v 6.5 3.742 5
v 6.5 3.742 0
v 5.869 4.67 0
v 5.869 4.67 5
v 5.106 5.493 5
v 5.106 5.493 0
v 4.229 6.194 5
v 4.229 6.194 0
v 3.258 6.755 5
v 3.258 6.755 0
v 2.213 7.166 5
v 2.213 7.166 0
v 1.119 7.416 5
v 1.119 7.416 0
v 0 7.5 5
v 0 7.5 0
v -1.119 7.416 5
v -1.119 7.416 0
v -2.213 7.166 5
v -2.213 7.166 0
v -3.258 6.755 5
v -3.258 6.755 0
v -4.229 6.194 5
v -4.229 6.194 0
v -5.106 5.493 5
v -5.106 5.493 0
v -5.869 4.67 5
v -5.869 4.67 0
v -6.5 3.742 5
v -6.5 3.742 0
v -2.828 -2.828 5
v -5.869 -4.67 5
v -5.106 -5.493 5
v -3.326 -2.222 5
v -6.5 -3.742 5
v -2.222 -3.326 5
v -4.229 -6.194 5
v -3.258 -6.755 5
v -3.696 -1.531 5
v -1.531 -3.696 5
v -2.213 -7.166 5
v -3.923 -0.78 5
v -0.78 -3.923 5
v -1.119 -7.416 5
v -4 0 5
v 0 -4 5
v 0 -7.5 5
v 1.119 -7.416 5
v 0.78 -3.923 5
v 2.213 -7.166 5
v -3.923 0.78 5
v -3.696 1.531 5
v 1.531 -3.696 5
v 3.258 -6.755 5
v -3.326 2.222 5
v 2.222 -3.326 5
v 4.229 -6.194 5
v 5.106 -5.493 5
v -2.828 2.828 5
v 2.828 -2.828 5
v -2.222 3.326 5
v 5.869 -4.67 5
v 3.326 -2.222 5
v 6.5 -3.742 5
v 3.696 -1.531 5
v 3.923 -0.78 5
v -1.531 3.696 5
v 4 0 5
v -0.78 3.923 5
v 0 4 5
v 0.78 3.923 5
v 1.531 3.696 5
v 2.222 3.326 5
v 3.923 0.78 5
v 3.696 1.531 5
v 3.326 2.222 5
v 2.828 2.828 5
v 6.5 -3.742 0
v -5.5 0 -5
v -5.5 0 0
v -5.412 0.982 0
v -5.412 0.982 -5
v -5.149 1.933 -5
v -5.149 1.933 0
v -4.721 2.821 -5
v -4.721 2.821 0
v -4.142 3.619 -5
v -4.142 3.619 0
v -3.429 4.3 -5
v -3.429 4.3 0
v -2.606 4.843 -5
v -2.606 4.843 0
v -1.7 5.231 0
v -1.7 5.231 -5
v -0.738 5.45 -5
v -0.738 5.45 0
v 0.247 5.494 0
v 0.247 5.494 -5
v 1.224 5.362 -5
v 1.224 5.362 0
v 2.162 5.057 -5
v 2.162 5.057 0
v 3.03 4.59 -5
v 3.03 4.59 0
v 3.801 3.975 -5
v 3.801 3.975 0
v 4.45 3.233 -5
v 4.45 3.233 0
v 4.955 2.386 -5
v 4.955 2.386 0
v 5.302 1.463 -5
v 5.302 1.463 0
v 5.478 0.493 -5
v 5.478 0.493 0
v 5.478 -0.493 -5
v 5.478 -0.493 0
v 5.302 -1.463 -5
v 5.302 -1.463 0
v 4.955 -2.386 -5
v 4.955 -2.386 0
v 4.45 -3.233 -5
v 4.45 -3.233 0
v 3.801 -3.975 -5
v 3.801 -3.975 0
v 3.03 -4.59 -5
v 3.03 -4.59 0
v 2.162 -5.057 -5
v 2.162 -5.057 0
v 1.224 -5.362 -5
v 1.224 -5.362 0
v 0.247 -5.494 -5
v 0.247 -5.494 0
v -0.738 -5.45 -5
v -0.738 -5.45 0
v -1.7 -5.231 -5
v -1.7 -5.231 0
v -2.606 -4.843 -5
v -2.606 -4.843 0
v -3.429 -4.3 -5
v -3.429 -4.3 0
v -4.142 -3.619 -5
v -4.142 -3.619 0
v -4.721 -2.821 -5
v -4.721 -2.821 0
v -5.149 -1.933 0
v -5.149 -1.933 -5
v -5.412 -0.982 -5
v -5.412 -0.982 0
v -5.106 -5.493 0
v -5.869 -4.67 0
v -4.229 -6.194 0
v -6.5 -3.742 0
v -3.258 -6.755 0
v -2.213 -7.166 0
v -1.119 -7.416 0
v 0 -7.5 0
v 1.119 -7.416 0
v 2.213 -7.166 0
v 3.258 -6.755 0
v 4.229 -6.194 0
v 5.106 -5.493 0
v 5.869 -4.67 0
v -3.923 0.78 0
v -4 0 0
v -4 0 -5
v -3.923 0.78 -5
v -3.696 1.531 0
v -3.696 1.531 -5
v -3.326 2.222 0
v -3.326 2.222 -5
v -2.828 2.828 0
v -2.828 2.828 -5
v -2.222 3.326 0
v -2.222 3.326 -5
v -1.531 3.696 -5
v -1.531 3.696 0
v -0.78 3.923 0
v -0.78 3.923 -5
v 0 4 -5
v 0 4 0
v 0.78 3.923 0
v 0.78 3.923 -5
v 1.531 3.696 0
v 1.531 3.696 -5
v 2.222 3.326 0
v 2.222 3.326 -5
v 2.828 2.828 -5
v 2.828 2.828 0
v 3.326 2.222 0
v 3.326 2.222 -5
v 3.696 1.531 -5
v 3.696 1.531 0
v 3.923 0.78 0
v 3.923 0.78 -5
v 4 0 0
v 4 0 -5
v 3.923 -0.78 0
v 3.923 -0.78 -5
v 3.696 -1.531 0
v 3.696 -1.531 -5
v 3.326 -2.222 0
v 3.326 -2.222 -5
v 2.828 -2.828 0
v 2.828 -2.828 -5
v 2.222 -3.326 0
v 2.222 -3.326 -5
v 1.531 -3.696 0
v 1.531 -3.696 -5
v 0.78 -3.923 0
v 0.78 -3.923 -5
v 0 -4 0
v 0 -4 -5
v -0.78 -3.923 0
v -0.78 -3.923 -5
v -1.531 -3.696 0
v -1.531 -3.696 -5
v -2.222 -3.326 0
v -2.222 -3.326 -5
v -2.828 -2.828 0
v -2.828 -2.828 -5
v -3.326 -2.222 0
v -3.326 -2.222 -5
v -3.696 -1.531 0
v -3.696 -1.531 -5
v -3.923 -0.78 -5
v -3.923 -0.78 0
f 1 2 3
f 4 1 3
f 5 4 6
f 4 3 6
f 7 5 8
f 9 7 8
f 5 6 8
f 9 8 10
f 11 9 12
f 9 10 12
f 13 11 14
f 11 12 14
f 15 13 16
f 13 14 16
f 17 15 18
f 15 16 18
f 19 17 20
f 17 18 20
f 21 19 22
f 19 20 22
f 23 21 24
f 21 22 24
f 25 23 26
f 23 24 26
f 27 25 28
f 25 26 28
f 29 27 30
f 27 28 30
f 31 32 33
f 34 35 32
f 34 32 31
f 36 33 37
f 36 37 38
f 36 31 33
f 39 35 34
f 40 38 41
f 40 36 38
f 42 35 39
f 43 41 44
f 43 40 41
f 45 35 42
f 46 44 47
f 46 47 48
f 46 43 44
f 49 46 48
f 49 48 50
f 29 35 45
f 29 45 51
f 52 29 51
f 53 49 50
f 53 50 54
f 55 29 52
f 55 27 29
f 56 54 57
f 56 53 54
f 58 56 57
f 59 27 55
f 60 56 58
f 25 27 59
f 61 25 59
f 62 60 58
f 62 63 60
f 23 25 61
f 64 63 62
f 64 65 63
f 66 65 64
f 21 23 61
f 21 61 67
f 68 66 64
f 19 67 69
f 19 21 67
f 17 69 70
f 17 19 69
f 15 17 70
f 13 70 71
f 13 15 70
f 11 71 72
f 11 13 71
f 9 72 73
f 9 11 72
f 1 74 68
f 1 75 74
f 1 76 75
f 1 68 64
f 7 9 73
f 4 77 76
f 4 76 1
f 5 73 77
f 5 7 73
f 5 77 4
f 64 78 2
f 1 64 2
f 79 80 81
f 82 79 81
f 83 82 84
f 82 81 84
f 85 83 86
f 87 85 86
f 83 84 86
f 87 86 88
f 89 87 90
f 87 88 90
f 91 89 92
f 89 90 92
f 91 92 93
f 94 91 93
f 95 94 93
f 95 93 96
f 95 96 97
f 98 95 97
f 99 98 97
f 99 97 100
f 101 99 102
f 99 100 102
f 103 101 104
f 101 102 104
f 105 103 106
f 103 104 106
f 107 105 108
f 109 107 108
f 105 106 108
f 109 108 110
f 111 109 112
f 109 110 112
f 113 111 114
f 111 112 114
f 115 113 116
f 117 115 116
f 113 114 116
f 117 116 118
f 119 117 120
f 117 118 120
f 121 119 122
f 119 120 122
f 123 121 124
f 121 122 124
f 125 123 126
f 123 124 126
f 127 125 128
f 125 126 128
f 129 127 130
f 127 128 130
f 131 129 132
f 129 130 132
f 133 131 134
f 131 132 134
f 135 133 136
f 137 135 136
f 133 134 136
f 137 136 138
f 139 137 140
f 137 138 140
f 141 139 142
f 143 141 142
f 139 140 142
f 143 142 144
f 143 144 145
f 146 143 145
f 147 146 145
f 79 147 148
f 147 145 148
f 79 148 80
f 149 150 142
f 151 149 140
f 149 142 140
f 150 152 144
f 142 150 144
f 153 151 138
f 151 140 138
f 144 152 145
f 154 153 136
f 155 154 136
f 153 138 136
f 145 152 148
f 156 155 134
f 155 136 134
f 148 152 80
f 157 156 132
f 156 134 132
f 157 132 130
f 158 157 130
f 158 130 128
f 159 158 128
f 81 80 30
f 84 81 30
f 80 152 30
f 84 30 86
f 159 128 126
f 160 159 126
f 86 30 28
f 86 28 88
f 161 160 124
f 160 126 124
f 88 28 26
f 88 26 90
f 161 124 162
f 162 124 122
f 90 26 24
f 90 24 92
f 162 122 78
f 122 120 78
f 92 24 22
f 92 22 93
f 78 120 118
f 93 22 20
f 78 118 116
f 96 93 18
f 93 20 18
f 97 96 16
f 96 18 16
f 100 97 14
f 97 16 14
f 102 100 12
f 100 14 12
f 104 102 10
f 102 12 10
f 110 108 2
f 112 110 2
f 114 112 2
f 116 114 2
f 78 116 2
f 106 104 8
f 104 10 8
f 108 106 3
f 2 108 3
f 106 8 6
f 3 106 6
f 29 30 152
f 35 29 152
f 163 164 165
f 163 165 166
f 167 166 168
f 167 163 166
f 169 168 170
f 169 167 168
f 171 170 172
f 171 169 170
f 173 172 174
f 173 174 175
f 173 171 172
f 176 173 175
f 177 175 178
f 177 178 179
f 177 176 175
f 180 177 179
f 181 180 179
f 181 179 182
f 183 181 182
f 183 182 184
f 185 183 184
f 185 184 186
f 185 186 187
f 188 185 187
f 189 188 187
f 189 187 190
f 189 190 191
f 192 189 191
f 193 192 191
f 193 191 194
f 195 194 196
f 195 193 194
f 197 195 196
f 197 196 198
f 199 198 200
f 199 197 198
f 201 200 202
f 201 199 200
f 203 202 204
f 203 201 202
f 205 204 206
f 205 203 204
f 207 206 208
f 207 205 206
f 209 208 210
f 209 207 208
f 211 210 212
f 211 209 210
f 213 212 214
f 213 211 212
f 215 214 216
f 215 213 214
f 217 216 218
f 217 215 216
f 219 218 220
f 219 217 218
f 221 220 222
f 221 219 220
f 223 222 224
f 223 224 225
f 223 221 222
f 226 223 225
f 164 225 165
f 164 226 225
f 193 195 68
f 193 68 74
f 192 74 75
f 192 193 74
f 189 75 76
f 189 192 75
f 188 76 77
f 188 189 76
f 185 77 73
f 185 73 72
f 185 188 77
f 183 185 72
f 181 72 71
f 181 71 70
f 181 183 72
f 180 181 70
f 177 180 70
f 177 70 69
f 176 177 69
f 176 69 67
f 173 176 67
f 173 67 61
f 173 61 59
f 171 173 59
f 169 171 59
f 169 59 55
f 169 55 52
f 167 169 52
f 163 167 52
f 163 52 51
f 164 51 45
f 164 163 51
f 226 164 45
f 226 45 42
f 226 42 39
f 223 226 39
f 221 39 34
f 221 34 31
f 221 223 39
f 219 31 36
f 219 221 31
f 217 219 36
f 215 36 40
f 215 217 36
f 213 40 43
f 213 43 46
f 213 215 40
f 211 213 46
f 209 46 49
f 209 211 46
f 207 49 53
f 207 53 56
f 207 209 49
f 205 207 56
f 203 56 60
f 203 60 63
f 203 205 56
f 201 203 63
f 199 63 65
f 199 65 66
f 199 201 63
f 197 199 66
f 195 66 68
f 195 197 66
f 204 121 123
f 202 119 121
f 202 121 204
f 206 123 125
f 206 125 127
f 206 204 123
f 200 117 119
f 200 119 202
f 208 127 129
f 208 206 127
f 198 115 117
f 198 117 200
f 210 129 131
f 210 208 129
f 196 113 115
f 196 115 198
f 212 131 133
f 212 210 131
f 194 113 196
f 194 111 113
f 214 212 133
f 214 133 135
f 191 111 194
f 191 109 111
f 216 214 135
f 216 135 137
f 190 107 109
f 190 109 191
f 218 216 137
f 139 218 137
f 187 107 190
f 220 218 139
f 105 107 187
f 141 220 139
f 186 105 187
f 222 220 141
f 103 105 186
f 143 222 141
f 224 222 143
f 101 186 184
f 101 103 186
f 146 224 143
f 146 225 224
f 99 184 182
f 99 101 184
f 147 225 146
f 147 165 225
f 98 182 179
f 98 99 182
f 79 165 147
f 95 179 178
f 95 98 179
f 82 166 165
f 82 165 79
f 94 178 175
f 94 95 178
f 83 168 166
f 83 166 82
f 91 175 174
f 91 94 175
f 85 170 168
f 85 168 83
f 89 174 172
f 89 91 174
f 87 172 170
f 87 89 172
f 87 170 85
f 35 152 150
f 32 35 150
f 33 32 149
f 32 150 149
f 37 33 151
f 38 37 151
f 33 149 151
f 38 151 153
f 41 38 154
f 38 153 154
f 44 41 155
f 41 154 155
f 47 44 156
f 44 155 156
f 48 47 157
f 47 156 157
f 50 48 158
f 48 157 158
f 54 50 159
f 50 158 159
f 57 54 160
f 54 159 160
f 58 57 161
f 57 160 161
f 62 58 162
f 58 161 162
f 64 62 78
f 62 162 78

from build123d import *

# Parameters (mm, degrees)
SKETCH1_R           = 4
BOSS_EXTRUDE1_DEPTH = 5
SKETCH2_R           = 5.5
SKETCH2_R_2         = 4
BOSS_EXTRUDE2_DEPTH = 5


with BuildPart() as part:
    # Sketch1 → Boss-Extrude1 (new body)
    with BuildSketch(Plane.XY):
        with BuildLine():
            Line((-6.5, 3.741657387), (-6.5, -3.741657387))
            ThreePointArc((-6.5, -3.741657387), (0, -7.5), (6.5, -3.741657387))
            Line((6.5, -3.741657387), (6.5, 3.741657387))
            ThreePointArc((6.5, 3.741657387), (0, 7.5), (-6.5, 3.741657387))
        make_face()
        Circle(SKETCH1_R, mode=Mode.SUBTRACT)
    extrude(amount=BOSS_EXTRUDE1_DEPTH)

    # Sketch2 → Boss-Extrude2 (add)
    with BuildSketch(Plane(origin=(0, 0, 0), x_dir=(-1, 0, 0), z_dir=(0, 0, -1))):
        Circle(SKETCH2_R)
        Circle(SKETCH2_R_2, mode=Mode.SUBTRACT)
    extrude(amount=BOSS_EXTRUDE2_DEPTH)


solid = part.part
